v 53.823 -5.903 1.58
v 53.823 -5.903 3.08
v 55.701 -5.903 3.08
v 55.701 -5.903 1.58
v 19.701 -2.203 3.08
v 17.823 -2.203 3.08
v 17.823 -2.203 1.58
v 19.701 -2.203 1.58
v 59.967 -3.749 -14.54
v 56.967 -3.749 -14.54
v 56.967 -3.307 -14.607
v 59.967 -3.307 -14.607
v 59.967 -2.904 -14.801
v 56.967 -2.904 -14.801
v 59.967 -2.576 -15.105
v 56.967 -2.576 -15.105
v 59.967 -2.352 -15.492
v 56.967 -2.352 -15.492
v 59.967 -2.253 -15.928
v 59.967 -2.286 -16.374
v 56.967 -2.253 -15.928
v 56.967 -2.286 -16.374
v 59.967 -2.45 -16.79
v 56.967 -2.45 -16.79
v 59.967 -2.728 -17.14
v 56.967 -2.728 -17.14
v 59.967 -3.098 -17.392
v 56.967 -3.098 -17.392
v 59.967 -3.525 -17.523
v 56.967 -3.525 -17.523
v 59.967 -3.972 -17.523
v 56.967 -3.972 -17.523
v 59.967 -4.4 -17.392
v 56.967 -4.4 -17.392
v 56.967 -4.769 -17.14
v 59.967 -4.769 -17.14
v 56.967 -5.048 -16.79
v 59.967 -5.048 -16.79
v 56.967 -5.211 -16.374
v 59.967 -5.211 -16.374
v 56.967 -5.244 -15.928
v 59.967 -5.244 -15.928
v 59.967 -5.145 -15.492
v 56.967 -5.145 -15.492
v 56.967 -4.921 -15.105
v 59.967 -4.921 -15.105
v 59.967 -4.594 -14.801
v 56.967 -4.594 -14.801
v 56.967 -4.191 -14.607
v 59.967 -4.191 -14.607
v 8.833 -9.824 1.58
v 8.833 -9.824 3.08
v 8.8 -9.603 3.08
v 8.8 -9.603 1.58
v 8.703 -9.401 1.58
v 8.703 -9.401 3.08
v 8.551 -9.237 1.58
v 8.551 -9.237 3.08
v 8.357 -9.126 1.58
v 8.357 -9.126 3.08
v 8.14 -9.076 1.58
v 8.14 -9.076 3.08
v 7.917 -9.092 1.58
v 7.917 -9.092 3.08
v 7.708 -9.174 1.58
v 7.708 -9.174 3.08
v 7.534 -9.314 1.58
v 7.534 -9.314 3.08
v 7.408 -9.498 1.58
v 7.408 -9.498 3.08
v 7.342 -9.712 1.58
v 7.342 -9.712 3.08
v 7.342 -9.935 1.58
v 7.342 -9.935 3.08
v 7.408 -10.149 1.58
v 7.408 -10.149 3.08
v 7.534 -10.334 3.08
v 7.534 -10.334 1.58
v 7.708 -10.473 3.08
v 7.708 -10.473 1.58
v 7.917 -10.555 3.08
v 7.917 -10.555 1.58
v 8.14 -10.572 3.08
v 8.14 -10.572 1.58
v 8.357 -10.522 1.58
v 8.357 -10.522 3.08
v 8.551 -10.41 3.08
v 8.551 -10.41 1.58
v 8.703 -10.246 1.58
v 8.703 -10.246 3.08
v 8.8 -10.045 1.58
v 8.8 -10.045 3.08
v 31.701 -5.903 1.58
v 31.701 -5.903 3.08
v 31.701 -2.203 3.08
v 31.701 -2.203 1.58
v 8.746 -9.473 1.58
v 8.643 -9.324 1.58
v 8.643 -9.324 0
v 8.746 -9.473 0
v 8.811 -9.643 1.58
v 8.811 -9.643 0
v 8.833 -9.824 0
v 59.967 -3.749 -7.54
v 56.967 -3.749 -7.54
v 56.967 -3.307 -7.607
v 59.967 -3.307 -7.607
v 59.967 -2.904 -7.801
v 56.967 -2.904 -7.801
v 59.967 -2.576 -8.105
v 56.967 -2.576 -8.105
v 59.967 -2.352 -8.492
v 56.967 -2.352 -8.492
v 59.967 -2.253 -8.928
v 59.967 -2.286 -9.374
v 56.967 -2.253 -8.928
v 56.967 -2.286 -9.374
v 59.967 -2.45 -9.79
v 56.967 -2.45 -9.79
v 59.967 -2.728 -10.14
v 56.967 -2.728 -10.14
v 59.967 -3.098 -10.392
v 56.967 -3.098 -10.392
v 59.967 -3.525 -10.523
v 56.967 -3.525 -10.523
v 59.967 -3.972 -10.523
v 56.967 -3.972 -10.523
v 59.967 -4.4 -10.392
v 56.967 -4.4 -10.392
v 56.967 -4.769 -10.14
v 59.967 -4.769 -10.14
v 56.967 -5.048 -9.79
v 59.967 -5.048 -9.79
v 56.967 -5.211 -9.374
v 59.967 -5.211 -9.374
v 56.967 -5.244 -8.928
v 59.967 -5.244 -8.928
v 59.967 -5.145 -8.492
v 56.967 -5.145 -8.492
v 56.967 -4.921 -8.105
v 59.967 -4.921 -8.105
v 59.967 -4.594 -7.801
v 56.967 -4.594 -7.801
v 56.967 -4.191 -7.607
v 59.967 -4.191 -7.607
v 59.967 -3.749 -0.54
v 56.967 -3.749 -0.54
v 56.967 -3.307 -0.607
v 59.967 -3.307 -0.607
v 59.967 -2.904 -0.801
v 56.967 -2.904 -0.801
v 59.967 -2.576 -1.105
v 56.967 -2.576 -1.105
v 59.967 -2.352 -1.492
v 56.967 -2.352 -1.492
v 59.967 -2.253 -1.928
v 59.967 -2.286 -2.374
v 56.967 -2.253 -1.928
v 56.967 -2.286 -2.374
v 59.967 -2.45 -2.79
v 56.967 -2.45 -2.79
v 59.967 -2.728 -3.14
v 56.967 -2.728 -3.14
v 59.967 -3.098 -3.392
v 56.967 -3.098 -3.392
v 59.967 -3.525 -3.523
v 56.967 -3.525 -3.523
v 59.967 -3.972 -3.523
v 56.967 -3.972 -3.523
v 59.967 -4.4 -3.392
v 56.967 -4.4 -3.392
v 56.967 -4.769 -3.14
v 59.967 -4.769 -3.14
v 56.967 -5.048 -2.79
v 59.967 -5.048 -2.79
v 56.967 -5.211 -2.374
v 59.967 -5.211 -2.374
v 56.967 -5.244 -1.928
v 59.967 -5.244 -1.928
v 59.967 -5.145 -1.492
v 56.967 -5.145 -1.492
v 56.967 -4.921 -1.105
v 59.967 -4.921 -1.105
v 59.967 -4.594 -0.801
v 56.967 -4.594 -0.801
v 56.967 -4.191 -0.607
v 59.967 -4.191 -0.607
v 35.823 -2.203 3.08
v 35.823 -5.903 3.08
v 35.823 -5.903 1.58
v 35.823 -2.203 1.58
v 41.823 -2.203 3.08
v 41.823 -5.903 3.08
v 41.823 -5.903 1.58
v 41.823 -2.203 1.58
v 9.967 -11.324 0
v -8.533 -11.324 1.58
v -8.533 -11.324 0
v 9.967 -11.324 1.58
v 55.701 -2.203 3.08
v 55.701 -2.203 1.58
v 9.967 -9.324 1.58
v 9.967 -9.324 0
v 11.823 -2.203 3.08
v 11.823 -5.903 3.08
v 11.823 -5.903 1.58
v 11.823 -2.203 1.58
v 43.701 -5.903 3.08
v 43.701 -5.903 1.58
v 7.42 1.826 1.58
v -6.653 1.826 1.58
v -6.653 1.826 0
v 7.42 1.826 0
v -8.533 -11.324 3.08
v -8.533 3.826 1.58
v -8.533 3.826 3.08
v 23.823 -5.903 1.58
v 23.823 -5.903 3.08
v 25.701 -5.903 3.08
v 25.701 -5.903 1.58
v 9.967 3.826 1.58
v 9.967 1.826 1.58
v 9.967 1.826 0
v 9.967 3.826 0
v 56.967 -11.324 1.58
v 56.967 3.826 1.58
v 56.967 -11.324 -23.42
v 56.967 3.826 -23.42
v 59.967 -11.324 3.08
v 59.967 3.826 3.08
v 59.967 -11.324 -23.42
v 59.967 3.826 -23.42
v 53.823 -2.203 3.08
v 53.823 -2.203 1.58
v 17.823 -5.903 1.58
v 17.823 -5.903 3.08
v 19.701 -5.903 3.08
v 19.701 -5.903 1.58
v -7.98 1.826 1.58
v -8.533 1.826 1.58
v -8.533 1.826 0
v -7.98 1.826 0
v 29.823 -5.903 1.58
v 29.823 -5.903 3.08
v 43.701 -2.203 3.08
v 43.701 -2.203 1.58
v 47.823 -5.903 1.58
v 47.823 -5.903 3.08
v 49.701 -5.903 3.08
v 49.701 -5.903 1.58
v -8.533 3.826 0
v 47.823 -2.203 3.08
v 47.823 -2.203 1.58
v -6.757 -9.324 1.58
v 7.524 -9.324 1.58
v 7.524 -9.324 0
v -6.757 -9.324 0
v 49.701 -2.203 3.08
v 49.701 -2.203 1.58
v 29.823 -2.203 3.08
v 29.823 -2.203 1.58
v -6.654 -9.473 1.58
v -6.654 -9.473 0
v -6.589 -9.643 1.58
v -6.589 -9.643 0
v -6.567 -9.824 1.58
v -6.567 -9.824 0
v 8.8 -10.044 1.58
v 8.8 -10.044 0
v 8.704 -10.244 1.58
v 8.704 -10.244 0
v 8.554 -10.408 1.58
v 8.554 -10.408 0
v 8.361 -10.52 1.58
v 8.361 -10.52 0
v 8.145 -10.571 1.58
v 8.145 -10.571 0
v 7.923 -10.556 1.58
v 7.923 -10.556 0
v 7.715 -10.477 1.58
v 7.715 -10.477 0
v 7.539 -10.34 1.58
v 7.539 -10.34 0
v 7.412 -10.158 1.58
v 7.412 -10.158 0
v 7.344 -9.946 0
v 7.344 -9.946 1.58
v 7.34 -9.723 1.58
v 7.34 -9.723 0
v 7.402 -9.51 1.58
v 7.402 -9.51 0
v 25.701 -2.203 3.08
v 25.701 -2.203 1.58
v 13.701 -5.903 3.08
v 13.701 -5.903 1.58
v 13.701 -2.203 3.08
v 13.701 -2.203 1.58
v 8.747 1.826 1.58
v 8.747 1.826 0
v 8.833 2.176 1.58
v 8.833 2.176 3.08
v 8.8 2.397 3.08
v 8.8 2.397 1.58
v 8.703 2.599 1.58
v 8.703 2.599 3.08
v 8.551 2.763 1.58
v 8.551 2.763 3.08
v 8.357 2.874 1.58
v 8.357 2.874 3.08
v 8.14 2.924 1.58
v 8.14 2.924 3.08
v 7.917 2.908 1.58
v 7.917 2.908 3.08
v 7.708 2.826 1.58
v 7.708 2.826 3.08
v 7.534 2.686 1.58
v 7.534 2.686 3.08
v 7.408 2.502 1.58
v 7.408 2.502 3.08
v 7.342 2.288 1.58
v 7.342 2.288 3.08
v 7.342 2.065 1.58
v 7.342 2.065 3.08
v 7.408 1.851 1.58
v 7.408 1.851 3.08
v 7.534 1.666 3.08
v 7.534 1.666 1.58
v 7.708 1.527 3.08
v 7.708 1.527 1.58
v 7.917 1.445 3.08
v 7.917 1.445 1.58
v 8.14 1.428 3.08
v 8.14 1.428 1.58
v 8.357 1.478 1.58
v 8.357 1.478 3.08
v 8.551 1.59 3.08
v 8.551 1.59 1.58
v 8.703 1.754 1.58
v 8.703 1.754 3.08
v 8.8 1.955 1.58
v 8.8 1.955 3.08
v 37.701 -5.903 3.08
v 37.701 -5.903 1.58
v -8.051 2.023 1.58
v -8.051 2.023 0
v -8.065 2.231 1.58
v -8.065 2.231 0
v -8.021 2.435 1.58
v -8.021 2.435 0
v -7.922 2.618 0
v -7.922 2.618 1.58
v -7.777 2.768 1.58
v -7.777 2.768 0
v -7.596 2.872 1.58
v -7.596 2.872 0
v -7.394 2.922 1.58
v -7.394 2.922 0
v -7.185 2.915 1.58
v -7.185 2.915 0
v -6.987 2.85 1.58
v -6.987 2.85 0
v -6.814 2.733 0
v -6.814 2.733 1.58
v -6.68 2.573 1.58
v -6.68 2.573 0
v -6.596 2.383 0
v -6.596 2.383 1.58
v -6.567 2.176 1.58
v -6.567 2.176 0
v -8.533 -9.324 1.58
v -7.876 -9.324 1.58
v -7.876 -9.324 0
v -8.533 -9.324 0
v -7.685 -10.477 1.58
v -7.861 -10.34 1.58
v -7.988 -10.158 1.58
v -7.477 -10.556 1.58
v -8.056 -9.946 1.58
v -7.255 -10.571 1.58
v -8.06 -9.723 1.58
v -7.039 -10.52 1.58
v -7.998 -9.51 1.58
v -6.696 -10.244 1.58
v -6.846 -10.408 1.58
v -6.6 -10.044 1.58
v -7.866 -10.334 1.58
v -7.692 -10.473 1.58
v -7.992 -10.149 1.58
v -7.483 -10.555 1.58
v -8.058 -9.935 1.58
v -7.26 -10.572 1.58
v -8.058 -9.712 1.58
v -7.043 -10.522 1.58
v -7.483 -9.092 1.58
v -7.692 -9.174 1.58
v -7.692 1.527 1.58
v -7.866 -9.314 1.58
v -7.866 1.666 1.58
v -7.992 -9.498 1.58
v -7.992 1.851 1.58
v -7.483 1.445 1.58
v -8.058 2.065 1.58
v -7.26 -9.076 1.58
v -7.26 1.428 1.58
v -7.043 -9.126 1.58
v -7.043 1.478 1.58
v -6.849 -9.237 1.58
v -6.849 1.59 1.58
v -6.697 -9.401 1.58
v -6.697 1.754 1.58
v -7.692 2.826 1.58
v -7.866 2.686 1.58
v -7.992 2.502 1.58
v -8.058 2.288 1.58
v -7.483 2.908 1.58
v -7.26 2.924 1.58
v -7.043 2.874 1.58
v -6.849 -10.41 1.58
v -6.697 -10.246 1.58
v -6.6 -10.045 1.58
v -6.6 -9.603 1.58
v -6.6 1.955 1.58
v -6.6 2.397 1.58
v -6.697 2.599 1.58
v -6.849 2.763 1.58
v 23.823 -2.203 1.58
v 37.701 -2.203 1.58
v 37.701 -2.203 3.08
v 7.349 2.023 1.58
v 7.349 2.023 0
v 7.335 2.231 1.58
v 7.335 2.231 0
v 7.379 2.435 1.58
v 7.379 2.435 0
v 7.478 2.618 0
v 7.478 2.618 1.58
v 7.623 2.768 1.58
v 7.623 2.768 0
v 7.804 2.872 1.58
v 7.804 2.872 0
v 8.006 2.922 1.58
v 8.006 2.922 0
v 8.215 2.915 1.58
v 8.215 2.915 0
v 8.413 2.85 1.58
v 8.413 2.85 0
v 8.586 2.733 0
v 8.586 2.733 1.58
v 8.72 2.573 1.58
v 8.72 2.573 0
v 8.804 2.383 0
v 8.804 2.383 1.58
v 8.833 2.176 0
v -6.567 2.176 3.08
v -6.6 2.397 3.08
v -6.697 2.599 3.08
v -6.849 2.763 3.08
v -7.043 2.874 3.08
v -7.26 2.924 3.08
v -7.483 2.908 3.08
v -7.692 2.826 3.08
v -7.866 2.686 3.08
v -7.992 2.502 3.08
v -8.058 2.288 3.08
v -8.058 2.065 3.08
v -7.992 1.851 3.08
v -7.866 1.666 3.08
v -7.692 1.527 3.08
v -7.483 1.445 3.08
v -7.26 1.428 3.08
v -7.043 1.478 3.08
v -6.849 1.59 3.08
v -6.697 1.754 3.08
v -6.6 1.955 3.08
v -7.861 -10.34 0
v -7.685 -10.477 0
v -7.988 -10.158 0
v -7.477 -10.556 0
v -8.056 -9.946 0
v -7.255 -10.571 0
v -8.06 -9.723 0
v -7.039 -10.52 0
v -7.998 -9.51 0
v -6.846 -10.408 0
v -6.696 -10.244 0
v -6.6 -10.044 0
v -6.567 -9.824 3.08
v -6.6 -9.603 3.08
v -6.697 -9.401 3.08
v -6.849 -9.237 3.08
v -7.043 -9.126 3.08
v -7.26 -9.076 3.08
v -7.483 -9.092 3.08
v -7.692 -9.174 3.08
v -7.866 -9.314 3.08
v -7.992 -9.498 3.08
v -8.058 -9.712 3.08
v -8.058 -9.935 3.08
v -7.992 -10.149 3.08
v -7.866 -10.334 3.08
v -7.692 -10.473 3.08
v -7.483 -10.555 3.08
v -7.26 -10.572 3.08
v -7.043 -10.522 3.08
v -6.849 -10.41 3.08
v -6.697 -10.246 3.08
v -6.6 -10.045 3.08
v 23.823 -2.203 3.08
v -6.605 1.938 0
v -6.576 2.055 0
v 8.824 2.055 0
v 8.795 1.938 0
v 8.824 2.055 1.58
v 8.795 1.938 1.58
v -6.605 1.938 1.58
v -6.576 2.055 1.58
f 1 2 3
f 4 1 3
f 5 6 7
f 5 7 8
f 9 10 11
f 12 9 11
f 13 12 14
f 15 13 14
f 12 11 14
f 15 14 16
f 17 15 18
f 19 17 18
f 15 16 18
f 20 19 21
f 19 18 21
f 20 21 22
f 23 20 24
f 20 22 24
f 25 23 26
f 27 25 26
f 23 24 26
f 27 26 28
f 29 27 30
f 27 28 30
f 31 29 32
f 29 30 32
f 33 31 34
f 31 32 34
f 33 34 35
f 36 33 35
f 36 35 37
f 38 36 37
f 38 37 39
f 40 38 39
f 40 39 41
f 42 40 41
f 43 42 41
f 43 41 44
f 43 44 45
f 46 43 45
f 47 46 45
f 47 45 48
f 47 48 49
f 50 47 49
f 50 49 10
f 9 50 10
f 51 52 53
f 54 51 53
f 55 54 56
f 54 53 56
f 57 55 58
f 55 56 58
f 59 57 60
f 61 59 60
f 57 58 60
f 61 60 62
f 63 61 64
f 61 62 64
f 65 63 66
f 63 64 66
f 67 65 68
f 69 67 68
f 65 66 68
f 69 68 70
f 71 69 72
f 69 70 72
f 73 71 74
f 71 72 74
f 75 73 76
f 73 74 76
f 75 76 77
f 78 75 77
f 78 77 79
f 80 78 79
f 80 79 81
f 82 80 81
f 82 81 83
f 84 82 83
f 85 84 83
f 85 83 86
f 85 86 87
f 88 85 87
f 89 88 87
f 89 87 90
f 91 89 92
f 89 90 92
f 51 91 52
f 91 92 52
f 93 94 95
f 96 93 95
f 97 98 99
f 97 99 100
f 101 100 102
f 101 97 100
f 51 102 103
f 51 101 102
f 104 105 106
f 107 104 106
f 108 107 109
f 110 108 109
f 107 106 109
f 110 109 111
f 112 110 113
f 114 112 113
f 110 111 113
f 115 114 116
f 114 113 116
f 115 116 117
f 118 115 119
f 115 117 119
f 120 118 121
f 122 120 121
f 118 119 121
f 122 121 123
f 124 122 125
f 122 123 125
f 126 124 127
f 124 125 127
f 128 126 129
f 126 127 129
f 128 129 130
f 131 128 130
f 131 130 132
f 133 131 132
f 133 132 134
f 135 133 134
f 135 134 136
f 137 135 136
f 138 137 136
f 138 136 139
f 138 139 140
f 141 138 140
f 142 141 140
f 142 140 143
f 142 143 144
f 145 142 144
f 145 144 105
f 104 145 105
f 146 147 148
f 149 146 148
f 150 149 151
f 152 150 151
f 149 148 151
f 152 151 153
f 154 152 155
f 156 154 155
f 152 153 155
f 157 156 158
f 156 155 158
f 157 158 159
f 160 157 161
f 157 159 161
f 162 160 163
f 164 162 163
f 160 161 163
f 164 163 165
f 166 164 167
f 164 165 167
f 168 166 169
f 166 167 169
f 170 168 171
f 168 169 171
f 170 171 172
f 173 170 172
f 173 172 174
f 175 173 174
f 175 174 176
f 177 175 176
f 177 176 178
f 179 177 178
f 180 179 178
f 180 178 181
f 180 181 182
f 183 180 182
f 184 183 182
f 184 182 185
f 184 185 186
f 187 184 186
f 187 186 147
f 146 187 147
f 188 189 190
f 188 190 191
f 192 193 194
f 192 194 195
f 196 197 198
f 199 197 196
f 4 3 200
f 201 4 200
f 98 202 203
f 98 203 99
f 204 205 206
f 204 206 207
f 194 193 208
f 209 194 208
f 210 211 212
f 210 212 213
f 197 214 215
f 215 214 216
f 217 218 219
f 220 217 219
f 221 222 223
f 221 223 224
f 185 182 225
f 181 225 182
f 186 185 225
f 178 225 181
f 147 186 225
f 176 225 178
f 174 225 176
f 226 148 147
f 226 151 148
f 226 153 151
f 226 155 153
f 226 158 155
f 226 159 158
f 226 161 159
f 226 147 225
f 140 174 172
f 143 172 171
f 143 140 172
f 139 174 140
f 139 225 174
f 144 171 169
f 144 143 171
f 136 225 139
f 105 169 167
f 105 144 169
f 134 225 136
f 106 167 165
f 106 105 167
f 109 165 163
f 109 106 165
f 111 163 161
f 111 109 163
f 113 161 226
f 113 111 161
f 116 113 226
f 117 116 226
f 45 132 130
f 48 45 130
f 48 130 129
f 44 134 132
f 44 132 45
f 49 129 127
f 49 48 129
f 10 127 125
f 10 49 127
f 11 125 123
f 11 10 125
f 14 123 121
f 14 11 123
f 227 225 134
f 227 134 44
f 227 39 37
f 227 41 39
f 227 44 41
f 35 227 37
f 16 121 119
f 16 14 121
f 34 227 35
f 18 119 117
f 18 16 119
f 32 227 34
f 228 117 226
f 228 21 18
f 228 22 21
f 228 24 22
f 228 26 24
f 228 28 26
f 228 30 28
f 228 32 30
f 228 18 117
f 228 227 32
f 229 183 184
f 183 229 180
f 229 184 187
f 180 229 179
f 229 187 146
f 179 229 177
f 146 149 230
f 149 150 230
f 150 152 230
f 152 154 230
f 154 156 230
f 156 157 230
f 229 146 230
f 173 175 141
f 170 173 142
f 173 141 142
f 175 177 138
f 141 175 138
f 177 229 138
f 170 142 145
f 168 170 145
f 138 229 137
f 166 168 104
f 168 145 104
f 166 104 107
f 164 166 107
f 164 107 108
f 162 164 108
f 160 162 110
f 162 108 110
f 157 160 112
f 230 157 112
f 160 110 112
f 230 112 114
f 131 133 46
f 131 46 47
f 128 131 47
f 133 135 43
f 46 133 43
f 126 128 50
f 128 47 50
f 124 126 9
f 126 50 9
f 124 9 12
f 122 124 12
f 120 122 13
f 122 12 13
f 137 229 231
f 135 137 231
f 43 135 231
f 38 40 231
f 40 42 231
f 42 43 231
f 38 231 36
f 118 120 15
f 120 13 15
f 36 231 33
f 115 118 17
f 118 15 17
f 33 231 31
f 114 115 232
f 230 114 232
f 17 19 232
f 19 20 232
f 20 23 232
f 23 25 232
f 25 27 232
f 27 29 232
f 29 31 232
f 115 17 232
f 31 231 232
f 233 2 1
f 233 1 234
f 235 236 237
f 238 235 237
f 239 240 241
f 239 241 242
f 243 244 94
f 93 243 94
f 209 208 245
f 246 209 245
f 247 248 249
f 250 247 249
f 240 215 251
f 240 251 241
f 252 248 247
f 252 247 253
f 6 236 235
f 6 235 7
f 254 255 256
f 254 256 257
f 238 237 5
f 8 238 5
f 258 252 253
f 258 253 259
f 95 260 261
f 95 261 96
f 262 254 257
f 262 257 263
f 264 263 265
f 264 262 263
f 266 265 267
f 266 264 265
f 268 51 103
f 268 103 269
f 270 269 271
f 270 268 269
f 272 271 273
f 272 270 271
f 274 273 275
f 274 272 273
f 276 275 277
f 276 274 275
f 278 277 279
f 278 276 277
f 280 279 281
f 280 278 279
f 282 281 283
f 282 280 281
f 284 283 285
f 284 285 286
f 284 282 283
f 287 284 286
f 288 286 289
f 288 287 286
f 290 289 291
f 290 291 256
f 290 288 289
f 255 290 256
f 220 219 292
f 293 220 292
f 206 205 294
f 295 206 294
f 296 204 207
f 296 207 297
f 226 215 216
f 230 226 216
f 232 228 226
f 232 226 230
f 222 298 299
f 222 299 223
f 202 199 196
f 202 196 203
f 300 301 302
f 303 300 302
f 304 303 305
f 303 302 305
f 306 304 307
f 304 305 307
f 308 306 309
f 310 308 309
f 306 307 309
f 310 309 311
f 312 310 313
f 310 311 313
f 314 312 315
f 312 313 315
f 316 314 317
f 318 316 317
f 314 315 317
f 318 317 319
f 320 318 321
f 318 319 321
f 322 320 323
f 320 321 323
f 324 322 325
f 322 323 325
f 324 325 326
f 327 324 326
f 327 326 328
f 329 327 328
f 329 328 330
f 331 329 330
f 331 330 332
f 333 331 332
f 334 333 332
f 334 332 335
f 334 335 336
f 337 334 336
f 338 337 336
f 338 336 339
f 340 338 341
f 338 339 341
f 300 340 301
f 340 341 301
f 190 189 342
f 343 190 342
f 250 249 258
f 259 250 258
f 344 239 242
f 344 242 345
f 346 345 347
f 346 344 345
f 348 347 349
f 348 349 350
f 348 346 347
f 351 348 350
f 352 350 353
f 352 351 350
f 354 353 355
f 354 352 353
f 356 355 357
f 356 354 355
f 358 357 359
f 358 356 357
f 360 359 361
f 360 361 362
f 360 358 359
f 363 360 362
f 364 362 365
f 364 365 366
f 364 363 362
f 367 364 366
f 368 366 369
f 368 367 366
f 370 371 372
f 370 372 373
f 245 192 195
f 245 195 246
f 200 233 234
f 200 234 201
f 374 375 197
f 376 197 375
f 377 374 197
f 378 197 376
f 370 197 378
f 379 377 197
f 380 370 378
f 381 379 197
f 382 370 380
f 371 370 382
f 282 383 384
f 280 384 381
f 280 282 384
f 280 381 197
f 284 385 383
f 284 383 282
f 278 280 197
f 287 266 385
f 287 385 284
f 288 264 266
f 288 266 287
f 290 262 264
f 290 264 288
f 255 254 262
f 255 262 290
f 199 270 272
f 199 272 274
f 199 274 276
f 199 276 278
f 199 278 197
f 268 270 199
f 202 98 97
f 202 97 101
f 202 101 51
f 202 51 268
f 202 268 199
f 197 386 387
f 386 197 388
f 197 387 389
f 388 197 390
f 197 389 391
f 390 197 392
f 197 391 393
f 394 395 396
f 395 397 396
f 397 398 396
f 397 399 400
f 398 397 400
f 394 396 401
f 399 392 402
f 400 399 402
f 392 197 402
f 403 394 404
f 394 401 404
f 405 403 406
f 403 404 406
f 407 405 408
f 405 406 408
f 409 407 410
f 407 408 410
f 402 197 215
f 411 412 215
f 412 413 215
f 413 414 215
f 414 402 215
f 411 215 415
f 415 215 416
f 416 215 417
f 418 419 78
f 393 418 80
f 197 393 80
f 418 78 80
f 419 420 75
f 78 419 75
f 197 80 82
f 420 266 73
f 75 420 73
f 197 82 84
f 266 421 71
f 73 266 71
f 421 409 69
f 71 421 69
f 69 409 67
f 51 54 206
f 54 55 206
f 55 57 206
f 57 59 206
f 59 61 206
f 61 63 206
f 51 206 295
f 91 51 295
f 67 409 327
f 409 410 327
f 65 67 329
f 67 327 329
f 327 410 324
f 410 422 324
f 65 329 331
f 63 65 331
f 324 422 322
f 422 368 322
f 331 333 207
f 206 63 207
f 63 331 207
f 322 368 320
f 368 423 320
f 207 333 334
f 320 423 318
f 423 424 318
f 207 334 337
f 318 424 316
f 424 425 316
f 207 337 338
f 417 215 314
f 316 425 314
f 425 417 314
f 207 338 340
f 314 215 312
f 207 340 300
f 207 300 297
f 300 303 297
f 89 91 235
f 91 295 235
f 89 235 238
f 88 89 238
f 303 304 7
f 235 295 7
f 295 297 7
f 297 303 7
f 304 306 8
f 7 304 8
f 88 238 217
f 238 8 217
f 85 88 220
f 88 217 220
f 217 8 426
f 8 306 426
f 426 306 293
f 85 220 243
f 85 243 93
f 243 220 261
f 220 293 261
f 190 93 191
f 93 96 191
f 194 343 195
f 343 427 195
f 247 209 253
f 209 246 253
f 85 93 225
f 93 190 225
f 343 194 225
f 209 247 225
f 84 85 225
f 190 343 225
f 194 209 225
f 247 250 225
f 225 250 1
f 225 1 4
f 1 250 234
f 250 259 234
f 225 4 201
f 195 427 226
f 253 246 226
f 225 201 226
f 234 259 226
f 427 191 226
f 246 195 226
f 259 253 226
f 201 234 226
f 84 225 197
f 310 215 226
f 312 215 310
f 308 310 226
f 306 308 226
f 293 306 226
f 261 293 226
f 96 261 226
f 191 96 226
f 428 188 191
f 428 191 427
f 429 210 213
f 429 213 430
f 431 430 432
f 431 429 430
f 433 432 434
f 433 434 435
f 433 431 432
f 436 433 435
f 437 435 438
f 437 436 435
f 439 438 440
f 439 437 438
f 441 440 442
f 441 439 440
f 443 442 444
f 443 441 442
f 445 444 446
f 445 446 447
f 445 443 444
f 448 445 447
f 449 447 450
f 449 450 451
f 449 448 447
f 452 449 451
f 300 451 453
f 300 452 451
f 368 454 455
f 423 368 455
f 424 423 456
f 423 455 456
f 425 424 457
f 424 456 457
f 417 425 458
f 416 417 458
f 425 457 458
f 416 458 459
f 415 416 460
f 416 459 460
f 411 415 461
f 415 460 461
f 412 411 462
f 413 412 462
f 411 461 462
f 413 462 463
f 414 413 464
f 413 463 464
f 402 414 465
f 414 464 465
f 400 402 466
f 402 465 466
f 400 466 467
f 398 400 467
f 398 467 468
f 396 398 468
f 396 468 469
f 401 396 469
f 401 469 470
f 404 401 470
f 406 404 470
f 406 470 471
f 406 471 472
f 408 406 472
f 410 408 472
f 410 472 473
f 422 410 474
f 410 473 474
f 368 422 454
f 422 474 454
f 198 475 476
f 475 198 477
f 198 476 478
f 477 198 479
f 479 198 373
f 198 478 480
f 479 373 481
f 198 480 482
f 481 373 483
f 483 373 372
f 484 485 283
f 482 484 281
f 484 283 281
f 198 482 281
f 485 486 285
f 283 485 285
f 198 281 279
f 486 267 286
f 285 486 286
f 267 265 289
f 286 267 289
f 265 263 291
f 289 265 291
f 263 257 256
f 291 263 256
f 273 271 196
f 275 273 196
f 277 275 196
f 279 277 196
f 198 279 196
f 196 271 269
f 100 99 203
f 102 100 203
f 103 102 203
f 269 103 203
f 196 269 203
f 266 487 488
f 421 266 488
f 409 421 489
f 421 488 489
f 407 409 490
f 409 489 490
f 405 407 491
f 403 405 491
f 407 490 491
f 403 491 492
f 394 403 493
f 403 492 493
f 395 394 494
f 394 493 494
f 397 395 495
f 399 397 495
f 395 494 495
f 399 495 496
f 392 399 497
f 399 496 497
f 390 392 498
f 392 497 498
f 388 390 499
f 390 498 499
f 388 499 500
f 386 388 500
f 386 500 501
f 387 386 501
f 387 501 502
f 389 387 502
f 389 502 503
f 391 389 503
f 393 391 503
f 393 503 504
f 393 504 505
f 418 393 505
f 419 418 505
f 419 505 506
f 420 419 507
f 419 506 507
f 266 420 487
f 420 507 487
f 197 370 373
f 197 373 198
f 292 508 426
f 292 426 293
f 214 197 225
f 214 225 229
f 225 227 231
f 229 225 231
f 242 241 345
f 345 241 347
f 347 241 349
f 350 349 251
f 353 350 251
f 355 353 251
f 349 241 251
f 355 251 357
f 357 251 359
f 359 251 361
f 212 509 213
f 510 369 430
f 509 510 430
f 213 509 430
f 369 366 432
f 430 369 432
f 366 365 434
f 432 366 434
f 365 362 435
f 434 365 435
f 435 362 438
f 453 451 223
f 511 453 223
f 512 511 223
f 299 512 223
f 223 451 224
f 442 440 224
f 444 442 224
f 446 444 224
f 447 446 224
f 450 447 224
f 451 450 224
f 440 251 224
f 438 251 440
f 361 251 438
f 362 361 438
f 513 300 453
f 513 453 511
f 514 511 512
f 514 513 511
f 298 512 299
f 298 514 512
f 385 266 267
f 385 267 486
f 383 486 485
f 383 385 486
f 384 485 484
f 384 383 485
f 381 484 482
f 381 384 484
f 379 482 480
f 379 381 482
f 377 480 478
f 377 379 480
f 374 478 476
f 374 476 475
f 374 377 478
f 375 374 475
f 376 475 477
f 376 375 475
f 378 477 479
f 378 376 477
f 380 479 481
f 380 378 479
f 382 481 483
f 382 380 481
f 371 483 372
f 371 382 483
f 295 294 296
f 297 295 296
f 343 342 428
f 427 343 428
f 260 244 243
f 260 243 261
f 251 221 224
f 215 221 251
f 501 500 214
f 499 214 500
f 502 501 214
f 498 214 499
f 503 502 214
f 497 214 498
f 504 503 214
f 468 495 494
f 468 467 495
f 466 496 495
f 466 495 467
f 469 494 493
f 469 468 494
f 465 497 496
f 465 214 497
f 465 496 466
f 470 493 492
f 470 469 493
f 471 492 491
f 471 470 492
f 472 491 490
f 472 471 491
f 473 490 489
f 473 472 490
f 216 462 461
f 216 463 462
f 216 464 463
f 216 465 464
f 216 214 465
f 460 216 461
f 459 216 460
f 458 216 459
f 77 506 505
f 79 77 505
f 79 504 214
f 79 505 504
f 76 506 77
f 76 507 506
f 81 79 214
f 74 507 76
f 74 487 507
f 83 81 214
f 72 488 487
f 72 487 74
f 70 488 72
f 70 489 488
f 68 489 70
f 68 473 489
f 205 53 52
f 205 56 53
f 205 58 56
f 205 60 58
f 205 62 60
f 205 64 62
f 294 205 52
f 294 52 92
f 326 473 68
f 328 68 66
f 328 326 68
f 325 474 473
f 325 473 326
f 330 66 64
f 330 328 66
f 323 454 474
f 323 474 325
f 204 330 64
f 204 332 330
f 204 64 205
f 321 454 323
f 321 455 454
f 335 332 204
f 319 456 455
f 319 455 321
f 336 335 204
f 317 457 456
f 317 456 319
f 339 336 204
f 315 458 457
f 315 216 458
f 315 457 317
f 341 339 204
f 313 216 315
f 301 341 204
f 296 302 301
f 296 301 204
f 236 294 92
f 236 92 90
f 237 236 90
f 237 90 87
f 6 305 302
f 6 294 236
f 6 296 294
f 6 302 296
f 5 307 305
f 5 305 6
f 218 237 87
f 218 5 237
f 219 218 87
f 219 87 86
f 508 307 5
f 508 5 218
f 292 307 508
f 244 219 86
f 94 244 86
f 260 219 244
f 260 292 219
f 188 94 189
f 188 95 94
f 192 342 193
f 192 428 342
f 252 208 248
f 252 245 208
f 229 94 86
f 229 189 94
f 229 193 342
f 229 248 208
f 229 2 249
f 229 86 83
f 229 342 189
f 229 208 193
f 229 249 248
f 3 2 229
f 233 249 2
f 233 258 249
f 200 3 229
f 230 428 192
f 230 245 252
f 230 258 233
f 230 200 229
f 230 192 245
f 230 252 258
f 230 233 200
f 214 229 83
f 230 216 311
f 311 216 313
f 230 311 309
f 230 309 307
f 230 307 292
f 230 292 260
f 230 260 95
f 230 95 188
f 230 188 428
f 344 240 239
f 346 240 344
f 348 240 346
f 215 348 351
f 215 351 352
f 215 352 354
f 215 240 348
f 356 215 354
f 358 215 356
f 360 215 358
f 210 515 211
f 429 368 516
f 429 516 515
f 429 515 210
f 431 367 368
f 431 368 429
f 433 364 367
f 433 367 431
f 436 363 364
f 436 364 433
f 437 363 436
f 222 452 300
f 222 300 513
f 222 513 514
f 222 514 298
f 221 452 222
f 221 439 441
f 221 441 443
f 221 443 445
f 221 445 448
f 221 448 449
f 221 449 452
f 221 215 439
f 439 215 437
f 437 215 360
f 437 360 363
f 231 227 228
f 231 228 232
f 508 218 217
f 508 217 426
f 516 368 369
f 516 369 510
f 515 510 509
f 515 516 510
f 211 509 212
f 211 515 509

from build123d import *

# Parameters (mm, degrees)
BOSS_EXTRUDE1_DEPTH      = 1.58
BOSS_EXTRUDE1_2_DEPTH    = 1.58
BOSS_EXTRUDE2_START      = 1.5
SKETCH1_3_W              = 65.5
SKETCH1_3_H              = 15.15
SKETCH1_3_R              = 0.75
SKETCH1_3_W_2            = 1.878830328
SKETCH1_3_H_2            = 3.699830122
BOSS_EXTRUDE2_DEPTH      = 1.5
BOSS_EXTRUDE3_DEPTH      = 1.5
BOSS_EXTRUDE3_DEPTH_BACK = 25
SKETCH1_4_W              = 3
SKETCH1_4_H              = 15.15
SKETCH2_R                = 1.5
CUT_EXTRUDE1_DEPTH       = 4.5


with BuildPart() as part:
    # Sketch1 → Boss-Extrude1 (new body)
    with BuildSketch(Plane.XY.offset(1.58)):
        with BuildLine():
            Line((8.746817406, 1.826324453), (9.967181452, 1.826324453))
            Line((9.967181452, 1.826324453), (9.967181452, 3.826324453))
            Line((9.967181452, 3.826324453), (-3.278308886, 3.826324453))
            Line((-3.278308886, 3.826324453), (-7.473042484, 3.826324453))
            Line((-7.473042484, 3.826324453), (-8.532818548, 3.826324453))
            Line((-8.532818548, 3.826324453), (-8.532818548, 1.826324453))
            Line((-8.532818548, 1.826324453), (-7.97983251, 1.826324453))
            ThreePointArc((-7.97983251, 1.826324453), (-7.496793826, 2.904333285), (-6.566507552, 2.176324453))
            ThreePointArc((-6.566507552, 2.176324453), (-6.58849872, 1.996038178), (-6.653182594, 1.826324453))
            Line((-6.653182594, 1.826324453), (7.42016749, 1.826324453))
            ThreePointArc((7.42016749, 1.826324453), (7.903206174, 2.904333285), (8.833492448, 2.176324453))
            ThreePointArc((8.833492448, 2.176324453), (8.81150128, 1.996038178), (8.746817406, 1.826324453))
        make_face()
    extrude(amount=-BOSS_EXTRUDE1_DEPTH)


with BuildPart() as body_2:
    # Sketch1 → Boss-Extrude1 2 (new body)
    with BuildSketch(Plane.XY.offset(1.58)):
        with BuildLine():
            Line((-3.278308886, -11.323675547), (9.967181452, -11.323675547))
            Line((9.967181452, -11.323675547), (9.967181452, -9.323675547))
            Line((9.967181452, -9.323675547), (8.642509443, -9.323675547))
            ThreePointArc((8.642509443, -9.323675547), (8.784121717, -9.55605898), (8.833492448, -9.823675547))
            ThreePointArc((8.833492448, -9.823675547), (7.815875881, -10.524304817), (7.524475454, -9.323675547))
            Line((7.524475454, -9.323675547), (-6.757490557, -9.323675547))
            ThreePointArc((-6.757490557, -9.323675547), (-6.615878283, -9.55605898), (-6.566507552, -9.823675547))
            ThreePointArc((-6.566507552, -9.823675547), (-7.584124119, -10.524304817), (-7.875524546, -9.323675547))
            Line((-7.875524546, -9.323675547), (-8.532818548, -9.323675547))
            Line((-8.532818548, -9.323675547), (-8.532818548, -11.323675547))
            Line((-8.532818548, -11.323675547), (-7.473042484, -11.323675547))
            Line((-7.473042484, -11.323675547), (-3.278308886, -11.323675547))
        make_face()
    extrude(amount=-BOSS_EXTRUDE1_2_DEPTH)


with BuildPart() as body_3:
    # Sketch1<3> → Boss-Extrude2 (new body)
    with BuildSketch(Plane.XY.offset(1.58).offset(BOSS_EXTRUDE2_START)):
        with Locations((24.217181452, -3.748675547)):
            Rectangle(SKETCH1_3_W, SKETCH1_3_H)
        with Locations((8.083492448, 2.176324453)):
            Circle(SKETCH1_3_R, mode=Mode.SUBTRACT)
        with Locations((-7.316507552, 2.176324453)):
            Circle(SKETCH1_3_R, mode=Mode.SUBTRACT)
        with Locations((8.083492448, -9.823675547)):
            Circle(SKETCH1_3_R, mode=Mode.SUBTRACT)
        with Locations((-7.316507552, -9.823675547)):
            Circle(SKETCH1_3_R, mode=Mode.SUBTRACT)
        with Locations((54.762005624, -4.052899192)):
            Rectangle(SKETCH1_3_W_2, SKETCH1_3_H_2, mode=Mode.SUBTRACT)
        with Locations((12.762005624, -4.052899192)):
            Rectangle(SKETCH1_3_W_2, SKETCH1_3_H_2, mode=Mode.SUBTRACT)
        with Locations((18.762005624, -4.052899192)):
            Rectangle(SKETCH1_3_W_2, SKETCH1_3_H_2, mode=Mode.SUBTRACT)
        with Locations((24.762005624, -4.052899192)):
            Rectangle(SKETCH1_3_W_2, SKETCH1_3_H_2, mode=Mode.SUBTRACT)
        with Locations((30.762005624, -4.052899192)):
            Rectangle(SKETCH1_3_W_2, SKETCH1_3_H_2, mode=Mode.SUBTRACT)
        with Locations((36.762005624, -4.052899192)):
            Rectangle(SKETCH1_3_W_2, SKETCH1_3_H_2, mode=Mode.SUBTRACT)
        with Locations((42.762005624, -4.052899192)):
            Rectangle(SKETCH1_3_W_2, SKETCH1_3_H_2, mode=Mode.SUBTRACT)
        with Locations((48.762005624, -4.052899192)):
            Rectangle(SKETCH1_3_W_2, SKETCH1_3_H_2, mode=Mode.SUBTRACT)
    extrude(amount=-BOSS_EXTRUDE2_DEPTH)

    # Sketch1<4> → Boss-Extrude3 (add, two sides: drawn at the far end of the back side and taken through both)
    with BuildSketch(Plane.XY.offset(1.58).offset(-BOSS_EXTRUDE3_DEPTH_BACK)):
        with Locations((58.467181452, -3.748675547)):
            Rectangle(SKETCH1_4_W, SKETCH1_4_H)
    extrude(amount=BOSS_EXTRUDE3_DEPTH + BOSS_EXTRUDE3_DEPTH_BACK)

    # Sketch2 → Cut-Extrude1 (cut)
    with BuildSketch(Plane.ZY.offset(-56.967181452)):
        with Locations((-2.040233352, -3.748675547)):
            Circle(SKETCH2_R)
        with Locations((-9.040233352, -3.748675547)):
            Circle(SKETCH2_R)
        with Locations((-16.040233352, -3.748675547)):
            Circle(SKETCH2_R)
    extrude(amount=-CUT_EXTRUDE1_DEPTH, mode=Mode.SUBTRACT)


solid = Compound([part.part, body_2.part, body_3.part])
